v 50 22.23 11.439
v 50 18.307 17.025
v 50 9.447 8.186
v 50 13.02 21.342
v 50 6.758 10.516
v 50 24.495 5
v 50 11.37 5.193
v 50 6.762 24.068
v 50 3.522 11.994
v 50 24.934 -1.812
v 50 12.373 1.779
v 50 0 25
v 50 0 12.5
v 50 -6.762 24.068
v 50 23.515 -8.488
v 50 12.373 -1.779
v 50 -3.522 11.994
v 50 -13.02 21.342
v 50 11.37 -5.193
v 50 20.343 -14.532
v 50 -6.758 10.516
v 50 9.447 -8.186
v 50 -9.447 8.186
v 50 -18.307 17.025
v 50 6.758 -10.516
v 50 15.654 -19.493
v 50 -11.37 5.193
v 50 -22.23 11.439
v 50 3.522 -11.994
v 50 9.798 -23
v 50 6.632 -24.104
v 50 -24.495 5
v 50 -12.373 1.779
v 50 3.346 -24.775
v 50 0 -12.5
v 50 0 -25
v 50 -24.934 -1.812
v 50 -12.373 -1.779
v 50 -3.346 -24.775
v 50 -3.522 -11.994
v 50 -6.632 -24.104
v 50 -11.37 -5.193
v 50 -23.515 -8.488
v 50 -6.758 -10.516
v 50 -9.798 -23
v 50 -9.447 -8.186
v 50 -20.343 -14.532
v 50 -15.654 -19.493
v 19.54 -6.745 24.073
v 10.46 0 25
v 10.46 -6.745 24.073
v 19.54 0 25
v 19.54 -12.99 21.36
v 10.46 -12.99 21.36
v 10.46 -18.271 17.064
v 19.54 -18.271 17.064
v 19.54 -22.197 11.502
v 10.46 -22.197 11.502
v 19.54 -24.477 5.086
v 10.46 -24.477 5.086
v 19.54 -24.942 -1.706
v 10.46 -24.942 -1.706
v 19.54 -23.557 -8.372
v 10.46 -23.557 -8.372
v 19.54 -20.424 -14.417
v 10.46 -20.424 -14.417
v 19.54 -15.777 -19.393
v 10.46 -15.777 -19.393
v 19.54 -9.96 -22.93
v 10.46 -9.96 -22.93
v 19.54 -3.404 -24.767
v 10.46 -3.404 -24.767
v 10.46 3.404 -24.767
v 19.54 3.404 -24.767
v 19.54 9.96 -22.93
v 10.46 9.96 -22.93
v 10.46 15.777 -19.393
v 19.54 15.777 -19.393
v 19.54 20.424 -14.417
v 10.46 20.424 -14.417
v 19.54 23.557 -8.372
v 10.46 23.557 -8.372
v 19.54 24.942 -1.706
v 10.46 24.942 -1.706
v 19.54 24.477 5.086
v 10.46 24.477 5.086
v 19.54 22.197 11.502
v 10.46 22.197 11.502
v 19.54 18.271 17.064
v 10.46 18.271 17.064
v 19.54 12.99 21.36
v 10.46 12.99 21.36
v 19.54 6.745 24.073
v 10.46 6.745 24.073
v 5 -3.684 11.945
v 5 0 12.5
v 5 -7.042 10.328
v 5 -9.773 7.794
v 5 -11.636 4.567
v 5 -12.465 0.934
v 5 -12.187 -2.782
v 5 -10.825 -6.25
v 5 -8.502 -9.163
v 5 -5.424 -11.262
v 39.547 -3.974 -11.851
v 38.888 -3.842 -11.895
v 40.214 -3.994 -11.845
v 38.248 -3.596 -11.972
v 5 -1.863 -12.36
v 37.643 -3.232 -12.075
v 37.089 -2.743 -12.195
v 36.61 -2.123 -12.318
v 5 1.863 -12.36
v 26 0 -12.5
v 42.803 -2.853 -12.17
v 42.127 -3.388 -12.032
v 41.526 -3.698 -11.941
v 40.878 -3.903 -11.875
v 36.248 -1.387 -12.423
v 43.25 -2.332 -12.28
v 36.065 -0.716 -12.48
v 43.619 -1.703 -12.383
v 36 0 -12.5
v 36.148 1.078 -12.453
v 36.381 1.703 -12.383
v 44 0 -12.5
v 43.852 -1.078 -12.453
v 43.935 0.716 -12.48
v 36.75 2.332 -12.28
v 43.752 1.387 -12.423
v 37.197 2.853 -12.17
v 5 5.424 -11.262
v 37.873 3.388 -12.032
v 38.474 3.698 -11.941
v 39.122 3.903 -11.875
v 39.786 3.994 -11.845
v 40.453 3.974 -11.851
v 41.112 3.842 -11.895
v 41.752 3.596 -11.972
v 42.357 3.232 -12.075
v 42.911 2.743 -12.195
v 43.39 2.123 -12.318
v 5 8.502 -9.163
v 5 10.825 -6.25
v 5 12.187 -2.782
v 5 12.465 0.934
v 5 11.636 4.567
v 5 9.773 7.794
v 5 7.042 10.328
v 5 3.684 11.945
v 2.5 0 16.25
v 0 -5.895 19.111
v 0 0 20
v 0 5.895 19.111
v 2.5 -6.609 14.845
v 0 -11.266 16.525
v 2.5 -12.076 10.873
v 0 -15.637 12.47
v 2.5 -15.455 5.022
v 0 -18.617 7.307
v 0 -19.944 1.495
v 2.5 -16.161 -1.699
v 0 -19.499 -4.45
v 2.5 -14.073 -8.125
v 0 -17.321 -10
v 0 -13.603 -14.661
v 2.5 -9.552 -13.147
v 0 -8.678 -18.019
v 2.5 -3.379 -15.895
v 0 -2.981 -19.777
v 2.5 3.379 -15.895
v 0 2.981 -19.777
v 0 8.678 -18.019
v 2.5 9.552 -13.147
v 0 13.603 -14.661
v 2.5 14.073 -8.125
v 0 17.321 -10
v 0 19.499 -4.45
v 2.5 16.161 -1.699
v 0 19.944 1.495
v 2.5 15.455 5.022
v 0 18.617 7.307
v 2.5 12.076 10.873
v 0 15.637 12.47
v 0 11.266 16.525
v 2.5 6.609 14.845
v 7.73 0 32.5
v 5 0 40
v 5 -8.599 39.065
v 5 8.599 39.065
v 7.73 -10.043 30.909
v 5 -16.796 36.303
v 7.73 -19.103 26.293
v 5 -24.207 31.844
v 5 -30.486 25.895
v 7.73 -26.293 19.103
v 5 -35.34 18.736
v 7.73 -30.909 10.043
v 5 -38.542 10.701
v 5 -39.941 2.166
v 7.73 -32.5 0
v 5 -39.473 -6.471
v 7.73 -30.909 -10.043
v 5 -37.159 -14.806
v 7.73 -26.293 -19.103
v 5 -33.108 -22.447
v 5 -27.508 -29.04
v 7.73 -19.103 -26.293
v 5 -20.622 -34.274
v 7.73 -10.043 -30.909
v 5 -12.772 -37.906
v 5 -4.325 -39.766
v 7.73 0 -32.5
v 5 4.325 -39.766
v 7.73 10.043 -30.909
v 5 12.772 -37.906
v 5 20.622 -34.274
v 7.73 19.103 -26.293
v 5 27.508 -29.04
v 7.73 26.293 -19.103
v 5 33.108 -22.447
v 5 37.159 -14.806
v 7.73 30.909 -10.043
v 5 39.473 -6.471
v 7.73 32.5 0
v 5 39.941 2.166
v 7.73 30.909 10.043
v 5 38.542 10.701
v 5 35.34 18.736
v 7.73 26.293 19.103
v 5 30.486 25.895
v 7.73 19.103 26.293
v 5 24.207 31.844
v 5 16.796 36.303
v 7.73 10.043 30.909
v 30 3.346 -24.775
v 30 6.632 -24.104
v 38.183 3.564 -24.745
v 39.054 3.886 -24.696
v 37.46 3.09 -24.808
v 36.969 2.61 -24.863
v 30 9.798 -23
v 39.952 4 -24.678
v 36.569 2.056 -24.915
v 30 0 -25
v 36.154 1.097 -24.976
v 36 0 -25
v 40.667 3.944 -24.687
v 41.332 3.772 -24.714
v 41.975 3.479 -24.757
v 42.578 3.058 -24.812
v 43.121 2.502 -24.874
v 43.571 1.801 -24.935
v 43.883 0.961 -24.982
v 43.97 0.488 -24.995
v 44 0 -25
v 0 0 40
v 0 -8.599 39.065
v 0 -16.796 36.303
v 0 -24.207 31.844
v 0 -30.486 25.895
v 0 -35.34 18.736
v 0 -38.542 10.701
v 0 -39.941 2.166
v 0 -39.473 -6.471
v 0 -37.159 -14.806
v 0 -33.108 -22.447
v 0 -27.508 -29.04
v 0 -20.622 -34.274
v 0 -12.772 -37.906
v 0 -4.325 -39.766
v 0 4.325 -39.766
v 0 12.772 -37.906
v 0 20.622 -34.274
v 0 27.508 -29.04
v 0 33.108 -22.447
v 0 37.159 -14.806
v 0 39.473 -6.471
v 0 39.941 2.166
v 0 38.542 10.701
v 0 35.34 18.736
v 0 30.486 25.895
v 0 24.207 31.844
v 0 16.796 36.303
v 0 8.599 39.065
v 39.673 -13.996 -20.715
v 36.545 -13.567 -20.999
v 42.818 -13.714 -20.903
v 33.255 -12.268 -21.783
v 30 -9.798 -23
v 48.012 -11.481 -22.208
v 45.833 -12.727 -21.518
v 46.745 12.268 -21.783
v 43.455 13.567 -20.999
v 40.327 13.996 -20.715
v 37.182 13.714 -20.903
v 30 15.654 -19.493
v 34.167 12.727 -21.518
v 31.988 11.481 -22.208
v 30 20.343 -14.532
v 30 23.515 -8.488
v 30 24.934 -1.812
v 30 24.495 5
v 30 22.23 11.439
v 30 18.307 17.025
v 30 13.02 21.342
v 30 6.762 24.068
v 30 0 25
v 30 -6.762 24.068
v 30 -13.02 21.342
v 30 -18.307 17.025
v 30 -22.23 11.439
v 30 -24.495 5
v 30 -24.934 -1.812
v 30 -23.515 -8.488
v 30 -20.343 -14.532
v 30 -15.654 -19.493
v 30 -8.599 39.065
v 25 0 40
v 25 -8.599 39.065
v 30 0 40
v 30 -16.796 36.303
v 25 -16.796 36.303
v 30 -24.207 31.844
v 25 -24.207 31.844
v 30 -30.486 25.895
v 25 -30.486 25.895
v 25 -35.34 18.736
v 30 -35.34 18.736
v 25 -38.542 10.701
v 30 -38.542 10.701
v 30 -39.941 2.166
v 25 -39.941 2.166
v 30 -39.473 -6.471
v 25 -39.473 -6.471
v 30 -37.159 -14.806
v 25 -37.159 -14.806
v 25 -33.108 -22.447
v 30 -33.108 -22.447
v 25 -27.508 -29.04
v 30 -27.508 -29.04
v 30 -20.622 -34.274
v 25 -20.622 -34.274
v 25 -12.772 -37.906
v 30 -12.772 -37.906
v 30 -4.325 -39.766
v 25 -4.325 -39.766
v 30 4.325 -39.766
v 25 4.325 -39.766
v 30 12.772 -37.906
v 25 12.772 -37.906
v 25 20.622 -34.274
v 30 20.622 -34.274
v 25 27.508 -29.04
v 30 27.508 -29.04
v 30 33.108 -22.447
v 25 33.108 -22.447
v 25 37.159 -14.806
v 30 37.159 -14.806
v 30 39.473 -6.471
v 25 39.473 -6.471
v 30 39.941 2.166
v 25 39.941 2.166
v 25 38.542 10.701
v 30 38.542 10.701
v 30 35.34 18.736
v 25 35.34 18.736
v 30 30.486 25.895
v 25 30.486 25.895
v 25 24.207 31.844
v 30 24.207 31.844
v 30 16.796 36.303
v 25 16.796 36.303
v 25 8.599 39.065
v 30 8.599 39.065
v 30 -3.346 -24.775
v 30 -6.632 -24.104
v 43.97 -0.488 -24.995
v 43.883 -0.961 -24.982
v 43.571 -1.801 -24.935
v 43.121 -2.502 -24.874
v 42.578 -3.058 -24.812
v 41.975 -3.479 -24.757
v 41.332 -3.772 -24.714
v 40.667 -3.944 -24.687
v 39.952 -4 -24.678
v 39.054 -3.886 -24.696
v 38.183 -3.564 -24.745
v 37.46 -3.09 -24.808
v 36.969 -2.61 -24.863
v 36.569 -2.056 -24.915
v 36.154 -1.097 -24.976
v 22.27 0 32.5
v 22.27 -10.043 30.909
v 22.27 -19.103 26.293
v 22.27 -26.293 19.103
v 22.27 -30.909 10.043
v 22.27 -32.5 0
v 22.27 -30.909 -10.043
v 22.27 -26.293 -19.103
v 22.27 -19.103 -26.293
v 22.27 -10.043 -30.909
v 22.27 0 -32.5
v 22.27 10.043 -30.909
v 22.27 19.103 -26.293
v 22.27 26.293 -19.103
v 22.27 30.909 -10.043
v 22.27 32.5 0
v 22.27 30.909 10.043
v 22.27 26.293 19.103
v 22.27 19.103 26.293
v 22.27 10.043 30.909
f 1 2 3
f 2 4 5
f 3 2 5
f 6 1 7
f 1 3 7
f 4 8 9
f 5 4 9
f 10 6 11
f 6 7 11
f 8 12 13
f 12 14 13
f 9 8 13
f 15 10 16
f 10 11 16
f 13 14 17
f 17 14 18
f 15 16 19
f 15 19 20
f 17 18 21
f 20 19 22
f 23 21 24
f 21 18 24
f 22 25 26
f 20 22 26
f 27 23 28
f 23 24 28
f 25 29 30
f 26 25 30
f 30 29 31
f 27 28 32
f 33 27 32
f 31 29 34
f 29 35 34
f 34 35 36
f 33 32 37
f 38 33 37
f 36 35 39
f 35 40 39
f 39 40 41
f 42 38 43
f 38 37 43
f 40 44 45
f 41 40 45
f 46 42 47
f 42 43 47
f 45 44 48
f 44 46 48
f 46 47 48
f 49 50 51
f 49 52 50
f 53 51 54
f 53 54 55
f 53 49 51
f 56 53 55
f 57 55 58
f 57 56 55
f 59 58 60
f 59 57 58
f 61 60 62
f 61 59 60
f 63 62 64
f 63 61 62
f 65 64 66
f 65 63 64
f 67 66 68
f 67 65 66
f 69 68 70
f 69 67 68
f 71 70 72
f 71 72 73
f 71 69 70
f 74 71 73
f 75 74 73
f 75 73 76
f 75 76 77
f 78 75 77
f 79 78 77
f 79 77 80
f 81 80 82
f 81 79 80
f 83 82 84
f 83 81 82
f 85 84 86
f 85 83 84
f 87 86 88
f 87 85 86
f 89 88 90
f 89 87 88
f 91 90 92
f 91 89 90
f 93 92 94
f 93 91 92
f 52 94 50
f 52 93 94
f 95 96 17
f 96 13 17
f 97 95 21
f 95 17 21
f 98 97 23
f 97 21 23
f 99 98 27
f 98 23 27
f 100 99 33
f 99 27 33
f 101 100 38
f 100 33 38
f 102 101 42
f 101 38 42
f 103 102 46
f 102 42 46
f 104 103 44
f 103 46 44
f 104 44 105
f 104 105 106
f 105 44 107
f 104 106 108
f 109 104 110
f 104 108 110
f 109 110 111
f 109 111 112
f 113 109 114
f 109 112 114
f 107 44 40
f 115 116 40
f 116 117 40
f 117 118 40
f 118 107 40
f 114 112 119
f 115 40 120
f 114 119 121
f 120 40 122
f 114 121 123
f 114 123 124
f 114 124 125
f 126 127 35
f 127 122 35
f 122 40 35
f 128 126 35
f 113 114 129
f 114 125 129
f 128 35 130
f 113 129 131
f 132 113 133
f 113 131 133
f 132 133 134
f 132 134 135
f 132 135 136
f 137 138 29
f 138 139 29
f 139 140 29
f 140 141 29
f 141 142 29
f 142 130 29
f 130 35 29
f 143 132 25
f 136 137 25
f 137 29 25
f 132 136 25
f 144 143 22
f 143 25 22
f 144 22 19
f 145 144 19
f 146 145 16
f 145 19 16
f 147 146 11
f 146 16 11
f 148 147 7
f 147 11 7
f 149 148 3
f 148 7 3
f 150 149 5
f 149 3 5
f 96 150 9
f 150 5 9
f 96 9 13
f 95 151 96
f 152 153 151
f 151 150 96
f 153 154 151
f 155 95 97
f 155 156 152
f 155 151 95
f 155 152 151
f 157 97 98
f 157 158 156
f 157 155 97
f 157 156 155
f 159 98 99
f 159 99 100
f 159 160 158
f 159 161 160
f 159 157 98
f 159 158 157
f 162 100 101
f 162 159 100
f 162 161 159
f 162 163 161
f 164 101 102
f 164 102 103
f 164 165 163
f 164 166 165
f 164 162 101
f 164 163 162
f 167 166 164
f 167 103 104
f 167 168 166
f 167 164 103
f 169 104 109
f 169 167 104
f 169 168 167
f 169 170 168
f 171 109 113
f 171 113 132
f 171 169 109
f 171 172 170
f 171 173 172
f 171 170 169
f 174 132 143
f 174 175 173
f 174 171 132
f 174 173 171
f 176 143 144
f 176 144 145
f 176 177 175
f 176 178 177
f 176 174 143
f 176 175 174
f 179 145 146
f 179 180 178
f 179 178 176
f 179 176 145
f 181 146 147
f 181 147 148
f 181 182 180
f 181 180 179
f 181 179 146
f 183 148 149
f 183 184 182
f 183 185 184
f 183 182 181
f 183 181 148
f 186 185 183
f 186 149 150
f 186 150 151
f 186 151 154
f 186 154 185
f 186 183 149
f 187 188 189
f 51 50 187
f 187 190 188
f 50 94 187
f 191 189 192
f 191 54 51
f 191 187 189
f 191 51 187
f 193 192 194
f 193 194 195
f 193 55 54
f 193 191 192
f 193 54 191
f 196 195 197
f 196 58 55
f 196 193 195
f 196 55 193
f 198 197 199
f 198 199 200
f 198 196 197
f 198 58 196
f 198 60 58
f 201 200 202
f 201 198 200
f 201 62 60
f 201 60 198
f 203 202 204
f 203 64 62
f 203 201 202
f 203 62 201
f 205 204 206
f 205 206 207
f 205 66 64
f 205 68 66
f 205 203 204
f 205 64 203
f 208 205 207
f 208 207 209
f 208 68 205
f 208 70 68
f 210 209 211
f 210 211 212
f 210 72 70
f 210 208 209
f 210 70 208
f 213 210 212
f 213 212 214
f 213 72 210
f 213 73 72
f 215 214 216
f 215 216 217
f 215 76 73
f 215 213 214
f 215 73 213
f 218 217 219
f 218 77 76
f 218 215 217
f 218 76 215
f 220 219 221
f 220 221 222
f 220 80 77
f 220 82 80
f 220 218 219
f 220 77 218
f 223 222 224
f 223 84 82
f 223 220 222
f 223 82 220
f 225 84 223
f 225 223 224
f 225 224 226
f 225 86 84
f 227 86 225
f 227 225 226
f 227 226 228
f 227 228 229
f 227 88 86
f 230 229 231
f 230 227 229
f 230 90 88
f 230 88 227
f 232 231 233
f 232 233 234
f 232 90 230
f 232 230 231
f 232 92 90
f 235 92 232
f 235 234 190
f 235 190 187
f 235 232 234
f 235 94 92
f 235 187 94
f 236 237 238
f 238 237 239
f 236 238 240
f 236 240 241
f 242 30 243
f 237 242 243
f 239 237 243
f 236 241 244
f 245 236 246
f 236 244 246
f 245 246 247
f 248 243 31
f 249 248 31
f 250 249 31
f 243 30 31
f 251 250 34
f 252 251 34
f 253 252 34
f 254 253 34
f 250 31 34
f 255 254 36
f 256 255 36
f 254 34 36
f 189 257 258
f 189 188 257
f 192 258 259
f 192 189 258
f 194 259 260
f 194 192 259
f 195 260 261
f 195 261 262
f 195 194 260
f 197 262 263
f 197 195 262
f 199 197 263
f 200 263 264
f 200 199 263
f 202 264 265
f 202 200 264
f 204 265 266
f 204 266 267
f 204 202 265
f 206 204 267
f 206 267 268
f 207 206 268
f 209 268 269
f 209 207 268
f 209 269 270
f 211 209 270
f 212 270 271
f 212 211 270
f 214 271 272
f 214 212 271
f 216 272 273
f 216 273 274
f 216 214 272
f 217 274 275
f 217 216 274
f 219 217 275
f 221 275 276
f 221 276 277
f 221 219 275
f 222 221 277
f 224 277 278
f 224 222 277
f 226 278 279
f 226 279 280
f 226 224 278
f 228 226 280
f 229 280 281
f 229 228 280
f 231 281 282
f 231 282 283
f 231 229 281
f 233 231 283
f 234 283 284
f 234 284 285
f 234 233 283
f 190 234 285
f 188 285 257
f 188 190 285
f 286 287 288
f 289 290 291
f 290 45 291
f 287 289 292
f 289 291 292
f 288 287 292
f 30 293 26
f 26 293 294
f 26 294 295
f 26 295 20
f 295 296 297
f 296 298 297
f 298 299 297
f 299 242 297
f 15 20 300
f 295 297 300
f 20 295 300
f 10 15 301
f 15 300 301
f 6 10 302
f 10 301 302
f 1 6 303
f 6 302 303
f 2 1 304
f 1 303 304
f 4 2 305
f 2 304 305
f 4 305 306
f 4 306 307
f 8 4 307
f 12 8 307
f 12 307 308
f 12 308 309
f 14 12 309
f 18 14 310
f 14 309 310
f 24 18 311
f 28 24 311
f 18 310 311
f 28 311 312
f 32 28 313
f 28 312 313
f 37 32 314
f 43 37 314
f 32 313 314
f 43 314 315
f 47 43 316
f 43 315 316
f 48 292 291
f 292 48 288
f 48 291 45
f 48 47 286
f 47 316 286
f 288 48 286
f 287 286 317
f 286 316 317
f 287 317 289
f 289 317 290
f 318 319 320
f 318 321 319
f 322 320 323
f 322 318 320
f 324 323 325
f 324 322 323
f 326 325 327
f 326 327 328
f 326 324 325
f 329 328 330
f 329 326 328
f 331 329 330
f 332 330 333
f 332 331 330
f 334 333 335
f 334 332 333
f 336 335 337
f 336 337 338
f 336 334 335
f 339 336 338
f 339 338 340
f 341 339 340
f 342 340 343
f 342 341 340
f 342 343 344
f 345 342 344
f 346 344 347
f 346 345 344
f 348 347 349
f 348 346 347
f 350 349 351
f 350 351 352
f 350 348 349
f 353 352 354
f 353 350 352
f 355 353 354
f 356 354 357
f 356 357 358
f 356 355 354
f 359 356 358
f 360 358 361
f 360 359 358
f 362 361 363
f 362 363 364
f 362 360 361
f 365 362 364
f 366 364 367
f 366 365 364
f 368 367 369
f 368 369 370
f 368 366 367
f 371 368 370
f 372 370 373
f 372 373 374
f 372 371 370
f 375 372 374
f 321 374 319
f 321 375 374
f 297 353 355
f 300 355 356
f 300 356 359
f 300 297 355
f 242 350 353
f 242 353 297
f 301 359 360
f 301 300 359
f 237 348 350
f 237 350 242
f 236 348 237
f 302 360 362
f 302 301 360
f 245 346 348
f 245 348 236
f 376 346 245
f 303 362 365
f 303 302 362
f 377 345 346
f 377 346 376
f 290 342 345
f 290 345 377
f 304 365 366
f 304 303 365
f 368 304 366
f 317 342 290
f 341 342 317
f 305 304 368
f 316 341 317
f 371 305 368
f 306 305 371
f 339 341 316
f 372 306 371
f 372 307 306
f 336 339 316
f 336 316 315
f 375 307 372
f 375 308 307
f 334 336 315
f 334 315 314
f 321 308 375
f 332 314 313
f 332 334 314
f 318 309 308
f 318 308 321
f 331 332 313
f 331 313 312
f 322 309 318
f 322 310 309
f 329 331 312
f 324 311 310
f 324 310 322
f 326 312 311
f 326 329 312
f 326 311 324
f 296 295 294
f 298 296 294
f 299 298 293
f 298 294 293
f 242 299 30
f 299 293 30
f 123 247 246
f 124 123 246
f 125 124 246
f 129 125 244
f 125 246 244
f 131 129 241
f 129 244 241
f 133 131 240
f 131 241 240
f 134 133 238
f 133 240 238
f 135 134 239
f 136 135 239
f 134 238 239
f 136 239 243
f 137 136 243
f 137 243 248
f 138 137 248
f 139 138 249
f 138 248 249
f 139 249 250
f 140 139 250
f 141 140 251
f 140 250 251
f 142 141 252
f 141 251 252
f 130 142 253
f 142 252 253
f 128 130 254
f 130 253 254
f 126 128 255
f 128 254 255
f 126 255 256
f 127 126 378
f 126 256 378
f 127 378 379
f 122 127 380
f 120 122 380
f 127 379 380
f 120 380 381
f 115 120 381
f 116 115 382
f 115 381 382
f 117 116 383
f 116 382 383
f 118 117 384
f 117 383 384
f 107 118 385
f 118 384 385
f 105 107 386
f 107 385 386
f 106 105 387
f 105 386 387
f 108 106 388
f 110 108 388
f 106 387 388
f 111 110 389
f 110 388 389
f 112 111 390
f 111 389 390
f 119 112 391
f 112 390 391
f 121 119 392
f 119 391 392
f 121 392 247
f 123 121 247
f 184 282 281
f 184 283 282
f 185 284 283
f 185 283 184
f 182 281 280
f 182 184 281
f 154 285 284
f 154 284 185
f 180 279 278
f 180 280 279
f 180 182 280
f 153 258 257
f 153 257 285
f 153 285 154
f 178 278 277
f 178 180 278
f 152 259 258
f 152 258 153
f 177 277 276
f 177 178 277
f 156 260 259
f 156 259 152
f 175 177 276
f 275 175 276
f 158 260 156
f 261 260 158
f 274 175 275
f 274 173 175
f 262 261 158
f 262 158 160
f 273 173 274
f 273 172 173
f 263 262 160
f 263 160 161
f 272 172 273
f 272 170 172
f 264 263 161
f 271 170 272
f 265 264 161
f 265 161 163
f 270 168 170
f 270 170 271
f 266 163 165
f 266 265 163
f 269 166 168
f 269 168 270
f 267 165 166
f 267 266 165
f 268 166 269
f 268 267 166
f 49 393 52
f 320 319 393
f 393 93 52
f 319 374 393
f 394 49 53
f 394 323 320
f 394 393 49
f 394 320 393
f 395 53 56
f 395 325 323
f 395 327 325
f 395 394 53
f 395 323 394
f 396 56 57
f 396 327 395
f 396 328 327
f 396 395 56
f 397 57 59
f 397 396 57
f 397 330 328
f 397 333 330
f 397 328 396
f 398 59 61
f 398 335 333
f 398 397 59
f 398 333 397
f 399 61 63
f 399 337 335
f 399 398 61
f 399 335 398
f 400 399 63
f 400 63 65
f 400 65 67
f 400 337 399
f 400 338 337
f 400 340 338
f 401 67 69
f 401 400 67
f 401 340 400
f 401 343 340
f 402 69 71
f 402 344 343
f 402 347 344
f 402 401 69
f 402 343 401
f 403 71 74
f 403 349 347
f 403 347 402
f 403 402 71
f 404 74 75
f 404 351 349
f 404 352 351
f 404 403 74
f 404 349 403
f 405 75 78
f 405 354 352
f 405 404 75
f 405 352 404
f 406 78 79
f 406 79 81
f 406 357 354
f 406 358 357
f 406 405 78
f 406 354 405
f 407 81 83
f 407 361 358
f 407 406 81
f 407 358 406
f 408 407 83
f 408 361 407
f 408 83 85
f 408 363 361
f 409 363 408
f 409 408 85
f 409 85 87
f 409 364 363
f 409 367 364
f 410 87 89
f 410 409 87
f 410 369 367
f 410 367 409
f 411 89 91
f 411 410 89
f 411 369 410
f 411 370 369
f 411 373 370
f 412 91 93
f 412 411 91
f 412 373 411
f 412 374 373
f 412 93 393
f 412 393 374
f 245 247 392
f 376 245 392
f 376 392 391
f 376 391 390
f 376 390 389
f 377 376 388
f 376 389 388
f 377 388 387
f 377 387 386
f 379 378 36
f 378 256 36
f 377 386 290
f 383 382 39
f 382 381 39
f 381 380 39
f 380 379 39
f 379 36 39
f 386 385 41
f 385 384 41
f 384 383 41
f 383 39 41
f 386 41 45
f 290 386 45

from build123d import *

# Parameters (mm, degrees)
SKETCH1_W          = 6
SKETCH1_H          = 12.5
SKETCH1_W_2        = 8
SKETCH7_W          = 10
SKETCH7_H          = 12.5
CUT_EXTRUDE1_REACH = 95.493
SKETCH8_R          = 4
CUT_EXTRUDE2_REACH = 87.277
CUT_EXTRUDE3_DEPTH = 20


with BuildPart() as part:
    # Sketch1 → Revolve1 (revolve)
    with BuildSketch(Plane(origin=(0, 0, 0), x_dir=(1, 0, 0), z_dir=(0, 1, 0)), mode=Mode.PRIVATE) as revolve1_sk:
        Polygon((5, 12.5), (0, 20), (0, 40), (5, 40), (10.459553514, 25), (19.540446486, 25), (25, 40), (30, 40), (30, 25), (36, 25), (36, 12.5), align=None)
        with Locations((47, 18.75)):
            Rectangle(SKETCH1_W, SKETCH1_H)
        with Locations((40, 18.75)):
            Rectangle(SKETCH1_W_2, SKETCH1_H)
    revolve(revolve1_sk.sketch.rotate(Axis((-23.221484356, 0, 0), (1, 0, 0)), 180), axis=Axis((-23.221484356, 0, 0), (1, 0, 0)))

    # Sketch7 → Revolve-Thin2 (revolve)
    with BuildSketch(Plane(origin=(0, 0, 0), x_dir=(1, 0, 0), z_dir=(0, 1, 0))):
        with Locations((31, 18.75)):
            Rectangle(SKETCH7_W, SKETCH7_H)
    revolve(axis=Axis((40, 0, -25), (0, 0, 1)))

    # Sketch8 → Cut-Extrude1 (cut, up to next)
    with BuildSketch(Plane(origin=(0, 0, -25), x_dir=(-1, 0, 0), z_dir=(0, 0, -1)), mode=Mode.PRIVATE) as cut_extrude1_sk1:
        with Locations((-40, 0)):
            Circle(SKETCH8_R)
    cut_extrude1_tool1 = extrude(cut_extrude1_sk1.sketch, amount=-CUT_EXTRUDE1_REACH, mode=Mode.PRIVATE) & part.part
    add(cut_extrude1_tool1.solids().sort_by_distance((40, 0, -25))[0], mode=Mode.SUBTRACT)

    # Sketch9 → Cut-Extrude2 (cut, up to next)
    with BuildSketch(Plane.XY.offset(-12.5), mode=Mode.PRIVATE) as cut_extrude2_sk1:
        with BuildLine():
            Line((50, 9.797958971), (50, -9.797958971))
            ThreePointArc((50, -9.797958971), (54, 0), (50, 9.797958971))
        make_face()
    cut_extrude2_tool1 = extrude(cut_extrude2_sk1.sketch, amount=-CUT_EXTRUDE2_REACH, mode=Mode.PRIVATE) & part.part
    add(cut_extrude2_tool1.solids().sort_by_distance((51.621368, 0, -12.5))[0], mode=Mode.SUBTRACT)

    # Sketch12 → Cut-Extrude3 (cut)
    with BuildSketch(Plane(origin=(50, 0, 0), x_dir=(0, 0, -1), z_dir=(1, 0, 0))):
        with BuildLine():
            Line((25, 9.797958971), (25, 14))
            Line((25, 14), (20.712315177, 14))
            ThreePointArc((20.712315177, 14), (21.956910341, 11.953831531), (23, 9.797958971))
            Line((23, 9.797958971), (25, 9.797958971))
        make_face()
        with BuildLine():
            Line((25, 0), (25, 9.797958971))
            Line((25, 9.797958971), (23, 9.797958971))
            ThreePointArc((23, 9.797958971), (24.494897428, 5), (25, 0))
        make_face()
        with BuildLine():
            ThreePointArc((23, -9.797958971), (21.956910341, -11.953831531), (20.712315177, -14))
            Line((20.712315177, -14), (25, -14))
            Line((25, -14), (25, -9.797958971))
            Line((25, -9.797958971), (23, -9.797958971))
        make_face()
        with BuildLine():
            Line((25, -9.797958971), (25, 0))
            ThreePointArc((25, 0), (24.494897428, -5), (23, -9.797958971))
            Line((23, -9.797958971), (25, -9.797958971))
        make_face()
    extrude(amount=-CUT_EXTRUDE3_DEPTH, mode=Mode.SUBTRACT)


solid = part.part
